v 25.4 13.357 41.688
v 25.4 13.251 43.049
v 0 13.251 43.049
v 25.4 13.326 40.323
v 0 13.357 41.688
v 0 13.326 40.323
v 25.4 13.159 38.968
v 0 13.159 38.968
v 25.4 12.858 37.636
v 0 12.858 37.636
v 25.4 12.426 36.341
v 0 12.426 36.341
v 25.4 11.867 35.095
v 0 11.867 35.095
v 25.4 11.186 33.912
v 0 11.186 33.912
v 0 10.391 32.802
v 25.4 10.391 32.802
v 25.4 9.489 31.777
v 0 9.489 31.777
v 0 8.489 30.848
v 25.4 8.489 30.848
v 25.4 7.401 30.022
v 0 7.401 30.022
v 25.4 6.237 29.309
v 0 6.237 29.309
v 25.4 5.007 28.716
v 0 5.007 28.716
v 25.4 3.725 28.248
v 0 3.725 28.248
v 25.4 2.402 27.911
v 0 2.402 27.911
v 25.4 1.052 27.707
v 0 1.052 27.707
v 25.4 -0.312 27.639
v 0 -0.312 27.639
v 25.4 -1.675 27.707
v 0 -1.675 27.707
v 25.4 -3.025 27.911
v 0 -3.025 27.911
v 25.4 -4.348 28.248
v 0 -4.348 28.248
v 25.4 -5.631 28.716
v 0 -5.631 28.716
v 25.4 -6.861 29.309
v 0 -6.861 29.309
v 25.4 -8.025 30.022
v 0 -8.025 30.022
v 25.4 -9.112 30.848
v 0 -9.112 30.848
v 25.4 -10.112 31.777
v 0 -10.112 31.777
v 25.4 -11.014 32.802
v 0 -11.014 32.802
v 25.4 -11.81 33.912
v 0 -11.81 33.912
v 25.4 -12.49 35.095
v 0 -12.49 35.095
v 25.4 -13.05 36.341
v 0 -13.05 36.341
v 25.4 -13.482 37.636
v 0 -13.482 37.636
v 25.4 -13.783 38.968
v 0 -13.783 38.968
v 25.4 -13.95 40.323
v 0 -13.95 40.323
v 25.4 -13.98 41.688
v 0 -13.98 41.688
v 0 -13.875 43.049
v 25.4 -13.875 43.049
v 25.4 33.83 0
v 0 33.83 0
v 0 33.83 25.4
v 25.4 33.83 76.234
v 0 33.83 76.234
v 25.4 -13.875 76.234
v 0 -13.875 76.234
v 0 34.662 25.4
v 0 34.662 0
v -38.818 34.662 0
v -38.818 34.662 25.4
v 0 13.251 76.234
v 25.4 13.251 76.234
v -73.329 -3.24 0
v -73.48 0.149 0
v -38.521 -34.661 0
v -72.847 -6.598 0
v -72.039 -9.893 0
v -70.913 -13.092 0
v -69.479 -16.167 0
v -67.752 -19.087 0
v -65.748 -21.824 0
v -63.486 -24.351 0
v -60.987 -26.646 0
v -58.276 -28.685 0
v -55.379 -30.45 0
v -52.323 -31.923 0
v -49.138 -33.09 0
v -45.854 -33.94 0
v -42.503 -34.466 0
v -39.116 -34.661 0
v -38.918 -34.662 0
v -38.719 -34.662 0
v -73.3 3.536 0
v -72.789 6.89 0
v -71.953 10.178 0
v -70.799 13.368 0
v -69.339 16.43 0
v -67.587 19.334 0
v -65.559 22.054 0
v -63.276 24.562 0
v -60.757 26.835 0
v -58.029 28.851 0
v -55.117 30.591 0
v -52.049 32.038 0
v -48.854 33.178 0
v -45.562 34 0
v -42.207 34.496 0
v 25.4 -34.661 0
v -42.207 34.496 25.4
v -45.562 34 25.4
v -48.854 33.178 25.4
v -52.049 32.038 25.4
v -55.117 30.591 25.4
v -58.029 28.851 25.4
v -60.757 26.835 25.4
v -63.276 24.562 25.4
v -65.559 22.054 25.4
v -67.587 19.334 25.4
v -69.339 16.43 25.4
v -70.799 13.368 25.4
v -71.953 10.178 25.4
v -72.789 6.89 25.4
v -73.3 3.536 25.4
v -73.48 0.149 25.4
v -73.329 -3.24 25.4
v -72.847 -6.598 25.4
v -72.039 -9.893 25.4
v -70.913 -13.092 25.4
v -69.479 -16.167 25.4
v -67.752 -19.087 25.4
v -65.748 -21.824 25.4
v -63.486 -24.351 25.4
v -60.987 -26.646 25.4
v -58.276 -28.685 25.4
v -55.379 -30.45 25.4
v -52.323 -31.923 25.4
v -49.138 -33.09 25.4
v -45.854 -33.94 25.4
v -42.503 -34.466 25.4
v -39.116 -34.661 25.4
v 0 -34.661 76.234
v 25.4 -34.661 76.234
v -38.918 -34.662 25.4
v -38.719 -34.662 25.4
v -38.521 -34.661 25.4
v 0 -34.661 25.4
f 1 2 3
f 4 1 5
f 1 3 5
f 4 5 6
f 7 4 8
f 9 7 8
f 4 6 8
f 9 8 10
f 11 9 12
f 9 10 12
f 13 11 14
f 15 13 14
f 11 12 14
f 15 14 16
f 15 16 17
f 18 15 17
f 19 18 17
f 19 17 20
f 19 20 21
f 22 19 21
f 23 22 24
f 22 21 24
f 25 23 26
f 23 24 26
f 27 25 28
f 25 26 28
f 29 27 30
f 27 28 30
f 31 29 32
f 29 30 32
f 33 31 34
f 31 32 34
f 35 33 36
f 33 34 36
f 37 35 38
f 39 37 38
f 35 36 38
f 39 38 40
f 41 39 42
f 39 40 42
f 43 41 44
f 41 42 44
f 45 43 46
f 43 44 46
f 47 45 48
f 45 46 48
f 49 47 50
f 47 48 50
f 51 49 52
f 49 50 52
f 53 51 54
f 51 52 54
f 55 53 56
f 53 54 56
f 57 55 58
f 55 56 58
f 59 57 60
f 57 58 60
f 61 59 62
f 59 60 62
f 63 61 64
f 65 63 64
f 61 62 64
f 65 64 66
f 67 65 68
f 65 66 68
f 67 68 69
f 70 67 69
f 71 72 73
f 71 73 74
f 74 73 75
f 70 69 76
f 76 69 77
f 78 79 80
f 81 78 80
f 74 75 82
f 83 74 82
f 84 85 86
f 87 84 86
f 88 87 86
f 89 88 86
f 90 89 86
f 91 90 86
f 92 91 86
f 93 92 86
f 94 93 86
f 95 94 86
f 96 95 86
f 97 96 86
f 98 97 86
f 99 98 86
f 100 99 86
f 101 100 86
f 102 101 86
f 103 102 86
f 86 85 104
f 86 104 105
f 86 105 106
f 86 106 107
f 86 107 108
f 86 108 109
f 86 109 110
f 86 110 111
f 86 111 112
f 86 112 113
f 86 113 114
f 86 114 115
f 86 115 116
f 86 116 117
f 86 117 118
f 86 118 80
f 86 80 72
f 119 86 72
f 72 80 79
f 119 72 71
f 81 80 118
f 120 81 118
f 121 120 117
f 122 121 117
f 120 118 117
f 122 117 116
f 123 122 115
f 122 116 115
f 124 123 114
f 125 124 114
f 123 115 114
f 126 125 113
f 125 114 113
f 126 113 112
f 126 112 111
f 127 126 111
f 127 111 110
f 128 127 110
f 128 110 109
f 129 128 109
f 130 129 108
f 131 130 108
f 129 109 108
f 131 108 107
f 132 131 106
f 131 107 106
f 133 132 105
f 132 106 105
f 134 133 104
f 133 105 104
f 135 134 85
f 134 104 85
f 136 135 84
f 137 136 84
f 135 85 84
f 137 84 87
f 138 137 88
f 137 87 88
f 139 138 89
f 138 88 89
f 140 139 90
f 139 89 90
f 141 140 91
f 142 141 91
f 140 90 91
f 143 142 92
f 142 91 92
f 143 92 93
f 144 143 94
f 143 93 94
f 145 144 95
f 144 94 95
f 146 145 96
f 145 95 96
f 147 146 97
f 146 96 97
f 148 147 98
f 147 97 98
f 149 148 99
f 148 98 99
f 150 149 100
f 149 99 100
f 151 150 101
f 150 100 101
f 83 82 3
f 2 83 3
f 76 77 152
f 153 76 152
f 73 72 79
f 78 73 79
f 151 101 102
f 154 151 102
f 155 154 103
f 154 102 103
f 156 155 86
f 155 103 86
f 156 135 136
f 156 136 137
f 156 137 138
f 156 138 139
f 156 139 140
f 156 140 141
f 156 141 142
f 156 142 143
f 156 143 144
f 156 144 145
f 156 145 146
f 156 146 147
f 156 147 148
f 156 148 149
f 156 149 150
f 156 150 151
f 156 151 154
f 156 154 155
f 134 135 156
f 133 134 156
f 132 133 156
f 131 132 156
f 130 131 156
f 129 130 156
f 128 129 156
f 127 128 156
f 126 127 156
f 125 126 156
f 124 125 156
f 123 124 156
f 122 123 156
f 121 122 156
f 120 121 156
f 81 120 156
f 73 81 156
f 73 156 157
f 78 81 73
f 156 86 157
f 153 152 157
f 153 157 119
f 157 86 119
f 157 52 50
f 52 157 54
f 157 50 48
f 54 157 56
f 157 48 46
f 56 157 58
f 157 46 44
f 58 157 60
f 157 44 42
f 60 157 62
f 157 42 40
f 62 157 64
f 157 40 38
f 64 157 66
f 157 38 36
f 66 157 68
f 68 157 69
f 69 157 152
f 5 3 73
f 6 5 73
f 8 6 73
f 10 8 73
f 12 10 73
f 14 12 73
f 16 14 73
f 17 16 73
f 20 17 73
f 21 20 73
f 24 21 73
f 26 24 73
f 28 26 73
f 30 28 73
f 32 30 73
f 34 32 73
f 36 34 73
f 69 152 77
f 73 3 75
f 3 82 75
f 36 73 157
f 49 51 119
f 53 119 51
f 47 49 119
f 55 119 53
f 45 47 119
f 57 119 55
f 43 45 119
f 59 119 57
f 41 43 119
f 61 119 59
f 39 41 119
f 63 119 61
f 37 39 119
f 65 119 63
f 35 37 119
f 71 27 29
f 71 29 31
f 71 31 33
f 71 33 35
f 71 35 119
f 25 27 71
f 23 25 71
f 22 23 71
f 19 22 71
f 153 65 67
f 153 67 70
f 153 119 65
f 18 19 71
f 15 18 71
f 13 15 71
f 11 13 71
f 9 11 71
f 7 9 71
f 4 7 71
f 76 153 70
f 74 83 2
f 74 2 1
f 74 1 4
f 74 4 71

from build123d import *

# Parameters (mm, degrees)
F1_DEPTH = 25.4
F3_DEPTH = 25.4


with BuildPart() as f1:
    # F0 (on Right) → F1 (new body)
    with BuildSketch(Plane.YZ):
        with BuildLine():
            Line((-13.87488, 76.233894), (-34.660738, 76.233894))
            Line((-34.660738, 76.233894), (-34.660738, 0))
            Line((-34.660738, 0), (33.829767, 0))
            Line((33.829767, 0), (33.829767, 76.233894))
            Line((33.829767, 76.233894), (13.251293, 76.233894))
            Line((13.251293, 76.233894), (13.251293, 43.04883))
            ThreePointArc((13.251293, 43.04883), (-0.311793, 27.639115), (-13.87488, 43.04883))
            Line((-13.87488, 43.04883), (-13.87488, 76.233894))
        make_face()
    extrude(amount=F1_DEPTH)

    # F2 (on Top) → F3 (join)
    with BuildSketch(Plane.XY):
        with BuildLine():
            Line((0, -34.660738), (0, 34.662017))
            Line((0, 34.662017), (-38.818482, 34.662017))
            ThreePointArc((-38.818482, 34.662017), (-73.480179, 0.148866), (-39.116211, -34.660738))
            Line((-39.116211, -34.660738), (-38.520754, -34.660738))
            Line((-38.520754, -34.660738), (0, -34.660738))
        make_face()
        with BuildLine():
            Line((-38.520754, -34.660738), (-39.116211, -34.660738))
            ThreePointArc((-39.116211, -34.660738), (-38.818482, -34.662017), (-38.520754, -34.660738))
        make_face()
    extrude(amount=F3_DEPTH)


solid = f1.part
